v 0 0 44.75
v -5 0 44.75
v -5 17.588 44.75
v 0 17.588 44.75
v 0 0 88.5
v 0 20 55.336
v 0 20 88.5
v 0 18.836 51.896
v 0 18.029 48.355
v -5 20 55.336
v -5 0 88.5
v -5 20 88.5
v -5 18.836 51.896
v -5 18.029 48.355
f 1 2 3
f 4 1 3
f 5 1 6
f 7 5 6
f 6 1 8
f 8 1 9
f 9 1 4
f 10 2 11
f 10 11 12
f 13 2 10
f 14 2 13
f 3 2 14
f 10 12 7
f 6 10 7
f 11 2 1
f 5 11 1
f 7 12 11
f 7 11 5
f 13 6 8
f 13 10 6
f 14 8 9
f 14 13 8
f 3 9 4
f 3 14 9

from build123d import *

# Parameters (mm, degrees)
SKETCH1_W               = 5
SKETCH1_H               = 20
BOSS_EXTRUDE1_DEPTH     = 88.5
CUT_EXTRUDE2_DEPTH      = 35
CUT_EXTRUDE2_DEPTH_BACK = 35
SKETCH5_R               = 35.5
SKETCH2_W               = 5
SKETCH2_H               = 20
CUT_EXTRUDE3_DEPTH      = 13
SKETCH8_W               = 39.75
SKETCH8_H               = 20
CUT_EXTRUDE4_DEPTH      = 13


with BuildPart() as part:
    # Sketch1 → Boss-Extrude1 (new body)
    with BuildSketch(Plane.XY):
        with Locations((-2.5, 10)):
            Rectangle(SKETCH1_W, SKETCH1_H)
    extrude(amount=BOSS_EXTRUDE1_DEPTH)

    # Sketch5 → Cut-Extrude2 (cut, two sides: drawn at the far end of the back side and taken through both)
    with BuildSketch(Plane(origin=(0, 0, 0), x_dir=(0, 0, -1), z_dir=(1, 0, 0)).offset(-CUT_EXTRUDE2_DEPTH_BACK)):
        with Locations((-42.25, 53)):
            Circle(SKETCH5_R)
    extrude(amount=CUT_EXTRUDE2_DEPTH + CUT_EXTRUDE2_DEPTH_BACK, mode=Mode.SUBTRACT)

    # Sketch2 → Cut-Extrude3 (cut)
    with BuildSketch(Plane.ZY.offset(5)):
        with Locations((42.25, 10)):
            Rectangle(SKETCH2_W, SKETCH2_H)
    extrude(amount=-CUT_EXTRUDE3_DEPTH, mode=Mode.SUBTRACT)


with BuildPart() as cut_extrude3_piece_1:
    # of the separate pieces the step leaves, piece 1, a body of its own (cut_extrude3_pieces)
    add(part.part.solids().sort_by_distance((0, 0, 44.75))[0])


with BuildPart() as cut_extrude3_piece_2:
    # of the separate pieces the step leaves, piece 2, a body of its own (cut_extrude3_pieces)
    add(part.part.solids().sort_by_distance((-5, 20, 0))[0])

    # Sketch8 → Cut-Extrude4 (cut)
    with BuildSketch(Plane.ZY.offset(5)):
        with Locations((19.875, 10)):
            Rectangle(SKETCH8_W, SKETCH8_H)
    extrude(amount=-CUT_EXTRUDE4_DEPTH, mode=Mode.SUBTRACT)


solid = cut_extrude3_piece_1.part
